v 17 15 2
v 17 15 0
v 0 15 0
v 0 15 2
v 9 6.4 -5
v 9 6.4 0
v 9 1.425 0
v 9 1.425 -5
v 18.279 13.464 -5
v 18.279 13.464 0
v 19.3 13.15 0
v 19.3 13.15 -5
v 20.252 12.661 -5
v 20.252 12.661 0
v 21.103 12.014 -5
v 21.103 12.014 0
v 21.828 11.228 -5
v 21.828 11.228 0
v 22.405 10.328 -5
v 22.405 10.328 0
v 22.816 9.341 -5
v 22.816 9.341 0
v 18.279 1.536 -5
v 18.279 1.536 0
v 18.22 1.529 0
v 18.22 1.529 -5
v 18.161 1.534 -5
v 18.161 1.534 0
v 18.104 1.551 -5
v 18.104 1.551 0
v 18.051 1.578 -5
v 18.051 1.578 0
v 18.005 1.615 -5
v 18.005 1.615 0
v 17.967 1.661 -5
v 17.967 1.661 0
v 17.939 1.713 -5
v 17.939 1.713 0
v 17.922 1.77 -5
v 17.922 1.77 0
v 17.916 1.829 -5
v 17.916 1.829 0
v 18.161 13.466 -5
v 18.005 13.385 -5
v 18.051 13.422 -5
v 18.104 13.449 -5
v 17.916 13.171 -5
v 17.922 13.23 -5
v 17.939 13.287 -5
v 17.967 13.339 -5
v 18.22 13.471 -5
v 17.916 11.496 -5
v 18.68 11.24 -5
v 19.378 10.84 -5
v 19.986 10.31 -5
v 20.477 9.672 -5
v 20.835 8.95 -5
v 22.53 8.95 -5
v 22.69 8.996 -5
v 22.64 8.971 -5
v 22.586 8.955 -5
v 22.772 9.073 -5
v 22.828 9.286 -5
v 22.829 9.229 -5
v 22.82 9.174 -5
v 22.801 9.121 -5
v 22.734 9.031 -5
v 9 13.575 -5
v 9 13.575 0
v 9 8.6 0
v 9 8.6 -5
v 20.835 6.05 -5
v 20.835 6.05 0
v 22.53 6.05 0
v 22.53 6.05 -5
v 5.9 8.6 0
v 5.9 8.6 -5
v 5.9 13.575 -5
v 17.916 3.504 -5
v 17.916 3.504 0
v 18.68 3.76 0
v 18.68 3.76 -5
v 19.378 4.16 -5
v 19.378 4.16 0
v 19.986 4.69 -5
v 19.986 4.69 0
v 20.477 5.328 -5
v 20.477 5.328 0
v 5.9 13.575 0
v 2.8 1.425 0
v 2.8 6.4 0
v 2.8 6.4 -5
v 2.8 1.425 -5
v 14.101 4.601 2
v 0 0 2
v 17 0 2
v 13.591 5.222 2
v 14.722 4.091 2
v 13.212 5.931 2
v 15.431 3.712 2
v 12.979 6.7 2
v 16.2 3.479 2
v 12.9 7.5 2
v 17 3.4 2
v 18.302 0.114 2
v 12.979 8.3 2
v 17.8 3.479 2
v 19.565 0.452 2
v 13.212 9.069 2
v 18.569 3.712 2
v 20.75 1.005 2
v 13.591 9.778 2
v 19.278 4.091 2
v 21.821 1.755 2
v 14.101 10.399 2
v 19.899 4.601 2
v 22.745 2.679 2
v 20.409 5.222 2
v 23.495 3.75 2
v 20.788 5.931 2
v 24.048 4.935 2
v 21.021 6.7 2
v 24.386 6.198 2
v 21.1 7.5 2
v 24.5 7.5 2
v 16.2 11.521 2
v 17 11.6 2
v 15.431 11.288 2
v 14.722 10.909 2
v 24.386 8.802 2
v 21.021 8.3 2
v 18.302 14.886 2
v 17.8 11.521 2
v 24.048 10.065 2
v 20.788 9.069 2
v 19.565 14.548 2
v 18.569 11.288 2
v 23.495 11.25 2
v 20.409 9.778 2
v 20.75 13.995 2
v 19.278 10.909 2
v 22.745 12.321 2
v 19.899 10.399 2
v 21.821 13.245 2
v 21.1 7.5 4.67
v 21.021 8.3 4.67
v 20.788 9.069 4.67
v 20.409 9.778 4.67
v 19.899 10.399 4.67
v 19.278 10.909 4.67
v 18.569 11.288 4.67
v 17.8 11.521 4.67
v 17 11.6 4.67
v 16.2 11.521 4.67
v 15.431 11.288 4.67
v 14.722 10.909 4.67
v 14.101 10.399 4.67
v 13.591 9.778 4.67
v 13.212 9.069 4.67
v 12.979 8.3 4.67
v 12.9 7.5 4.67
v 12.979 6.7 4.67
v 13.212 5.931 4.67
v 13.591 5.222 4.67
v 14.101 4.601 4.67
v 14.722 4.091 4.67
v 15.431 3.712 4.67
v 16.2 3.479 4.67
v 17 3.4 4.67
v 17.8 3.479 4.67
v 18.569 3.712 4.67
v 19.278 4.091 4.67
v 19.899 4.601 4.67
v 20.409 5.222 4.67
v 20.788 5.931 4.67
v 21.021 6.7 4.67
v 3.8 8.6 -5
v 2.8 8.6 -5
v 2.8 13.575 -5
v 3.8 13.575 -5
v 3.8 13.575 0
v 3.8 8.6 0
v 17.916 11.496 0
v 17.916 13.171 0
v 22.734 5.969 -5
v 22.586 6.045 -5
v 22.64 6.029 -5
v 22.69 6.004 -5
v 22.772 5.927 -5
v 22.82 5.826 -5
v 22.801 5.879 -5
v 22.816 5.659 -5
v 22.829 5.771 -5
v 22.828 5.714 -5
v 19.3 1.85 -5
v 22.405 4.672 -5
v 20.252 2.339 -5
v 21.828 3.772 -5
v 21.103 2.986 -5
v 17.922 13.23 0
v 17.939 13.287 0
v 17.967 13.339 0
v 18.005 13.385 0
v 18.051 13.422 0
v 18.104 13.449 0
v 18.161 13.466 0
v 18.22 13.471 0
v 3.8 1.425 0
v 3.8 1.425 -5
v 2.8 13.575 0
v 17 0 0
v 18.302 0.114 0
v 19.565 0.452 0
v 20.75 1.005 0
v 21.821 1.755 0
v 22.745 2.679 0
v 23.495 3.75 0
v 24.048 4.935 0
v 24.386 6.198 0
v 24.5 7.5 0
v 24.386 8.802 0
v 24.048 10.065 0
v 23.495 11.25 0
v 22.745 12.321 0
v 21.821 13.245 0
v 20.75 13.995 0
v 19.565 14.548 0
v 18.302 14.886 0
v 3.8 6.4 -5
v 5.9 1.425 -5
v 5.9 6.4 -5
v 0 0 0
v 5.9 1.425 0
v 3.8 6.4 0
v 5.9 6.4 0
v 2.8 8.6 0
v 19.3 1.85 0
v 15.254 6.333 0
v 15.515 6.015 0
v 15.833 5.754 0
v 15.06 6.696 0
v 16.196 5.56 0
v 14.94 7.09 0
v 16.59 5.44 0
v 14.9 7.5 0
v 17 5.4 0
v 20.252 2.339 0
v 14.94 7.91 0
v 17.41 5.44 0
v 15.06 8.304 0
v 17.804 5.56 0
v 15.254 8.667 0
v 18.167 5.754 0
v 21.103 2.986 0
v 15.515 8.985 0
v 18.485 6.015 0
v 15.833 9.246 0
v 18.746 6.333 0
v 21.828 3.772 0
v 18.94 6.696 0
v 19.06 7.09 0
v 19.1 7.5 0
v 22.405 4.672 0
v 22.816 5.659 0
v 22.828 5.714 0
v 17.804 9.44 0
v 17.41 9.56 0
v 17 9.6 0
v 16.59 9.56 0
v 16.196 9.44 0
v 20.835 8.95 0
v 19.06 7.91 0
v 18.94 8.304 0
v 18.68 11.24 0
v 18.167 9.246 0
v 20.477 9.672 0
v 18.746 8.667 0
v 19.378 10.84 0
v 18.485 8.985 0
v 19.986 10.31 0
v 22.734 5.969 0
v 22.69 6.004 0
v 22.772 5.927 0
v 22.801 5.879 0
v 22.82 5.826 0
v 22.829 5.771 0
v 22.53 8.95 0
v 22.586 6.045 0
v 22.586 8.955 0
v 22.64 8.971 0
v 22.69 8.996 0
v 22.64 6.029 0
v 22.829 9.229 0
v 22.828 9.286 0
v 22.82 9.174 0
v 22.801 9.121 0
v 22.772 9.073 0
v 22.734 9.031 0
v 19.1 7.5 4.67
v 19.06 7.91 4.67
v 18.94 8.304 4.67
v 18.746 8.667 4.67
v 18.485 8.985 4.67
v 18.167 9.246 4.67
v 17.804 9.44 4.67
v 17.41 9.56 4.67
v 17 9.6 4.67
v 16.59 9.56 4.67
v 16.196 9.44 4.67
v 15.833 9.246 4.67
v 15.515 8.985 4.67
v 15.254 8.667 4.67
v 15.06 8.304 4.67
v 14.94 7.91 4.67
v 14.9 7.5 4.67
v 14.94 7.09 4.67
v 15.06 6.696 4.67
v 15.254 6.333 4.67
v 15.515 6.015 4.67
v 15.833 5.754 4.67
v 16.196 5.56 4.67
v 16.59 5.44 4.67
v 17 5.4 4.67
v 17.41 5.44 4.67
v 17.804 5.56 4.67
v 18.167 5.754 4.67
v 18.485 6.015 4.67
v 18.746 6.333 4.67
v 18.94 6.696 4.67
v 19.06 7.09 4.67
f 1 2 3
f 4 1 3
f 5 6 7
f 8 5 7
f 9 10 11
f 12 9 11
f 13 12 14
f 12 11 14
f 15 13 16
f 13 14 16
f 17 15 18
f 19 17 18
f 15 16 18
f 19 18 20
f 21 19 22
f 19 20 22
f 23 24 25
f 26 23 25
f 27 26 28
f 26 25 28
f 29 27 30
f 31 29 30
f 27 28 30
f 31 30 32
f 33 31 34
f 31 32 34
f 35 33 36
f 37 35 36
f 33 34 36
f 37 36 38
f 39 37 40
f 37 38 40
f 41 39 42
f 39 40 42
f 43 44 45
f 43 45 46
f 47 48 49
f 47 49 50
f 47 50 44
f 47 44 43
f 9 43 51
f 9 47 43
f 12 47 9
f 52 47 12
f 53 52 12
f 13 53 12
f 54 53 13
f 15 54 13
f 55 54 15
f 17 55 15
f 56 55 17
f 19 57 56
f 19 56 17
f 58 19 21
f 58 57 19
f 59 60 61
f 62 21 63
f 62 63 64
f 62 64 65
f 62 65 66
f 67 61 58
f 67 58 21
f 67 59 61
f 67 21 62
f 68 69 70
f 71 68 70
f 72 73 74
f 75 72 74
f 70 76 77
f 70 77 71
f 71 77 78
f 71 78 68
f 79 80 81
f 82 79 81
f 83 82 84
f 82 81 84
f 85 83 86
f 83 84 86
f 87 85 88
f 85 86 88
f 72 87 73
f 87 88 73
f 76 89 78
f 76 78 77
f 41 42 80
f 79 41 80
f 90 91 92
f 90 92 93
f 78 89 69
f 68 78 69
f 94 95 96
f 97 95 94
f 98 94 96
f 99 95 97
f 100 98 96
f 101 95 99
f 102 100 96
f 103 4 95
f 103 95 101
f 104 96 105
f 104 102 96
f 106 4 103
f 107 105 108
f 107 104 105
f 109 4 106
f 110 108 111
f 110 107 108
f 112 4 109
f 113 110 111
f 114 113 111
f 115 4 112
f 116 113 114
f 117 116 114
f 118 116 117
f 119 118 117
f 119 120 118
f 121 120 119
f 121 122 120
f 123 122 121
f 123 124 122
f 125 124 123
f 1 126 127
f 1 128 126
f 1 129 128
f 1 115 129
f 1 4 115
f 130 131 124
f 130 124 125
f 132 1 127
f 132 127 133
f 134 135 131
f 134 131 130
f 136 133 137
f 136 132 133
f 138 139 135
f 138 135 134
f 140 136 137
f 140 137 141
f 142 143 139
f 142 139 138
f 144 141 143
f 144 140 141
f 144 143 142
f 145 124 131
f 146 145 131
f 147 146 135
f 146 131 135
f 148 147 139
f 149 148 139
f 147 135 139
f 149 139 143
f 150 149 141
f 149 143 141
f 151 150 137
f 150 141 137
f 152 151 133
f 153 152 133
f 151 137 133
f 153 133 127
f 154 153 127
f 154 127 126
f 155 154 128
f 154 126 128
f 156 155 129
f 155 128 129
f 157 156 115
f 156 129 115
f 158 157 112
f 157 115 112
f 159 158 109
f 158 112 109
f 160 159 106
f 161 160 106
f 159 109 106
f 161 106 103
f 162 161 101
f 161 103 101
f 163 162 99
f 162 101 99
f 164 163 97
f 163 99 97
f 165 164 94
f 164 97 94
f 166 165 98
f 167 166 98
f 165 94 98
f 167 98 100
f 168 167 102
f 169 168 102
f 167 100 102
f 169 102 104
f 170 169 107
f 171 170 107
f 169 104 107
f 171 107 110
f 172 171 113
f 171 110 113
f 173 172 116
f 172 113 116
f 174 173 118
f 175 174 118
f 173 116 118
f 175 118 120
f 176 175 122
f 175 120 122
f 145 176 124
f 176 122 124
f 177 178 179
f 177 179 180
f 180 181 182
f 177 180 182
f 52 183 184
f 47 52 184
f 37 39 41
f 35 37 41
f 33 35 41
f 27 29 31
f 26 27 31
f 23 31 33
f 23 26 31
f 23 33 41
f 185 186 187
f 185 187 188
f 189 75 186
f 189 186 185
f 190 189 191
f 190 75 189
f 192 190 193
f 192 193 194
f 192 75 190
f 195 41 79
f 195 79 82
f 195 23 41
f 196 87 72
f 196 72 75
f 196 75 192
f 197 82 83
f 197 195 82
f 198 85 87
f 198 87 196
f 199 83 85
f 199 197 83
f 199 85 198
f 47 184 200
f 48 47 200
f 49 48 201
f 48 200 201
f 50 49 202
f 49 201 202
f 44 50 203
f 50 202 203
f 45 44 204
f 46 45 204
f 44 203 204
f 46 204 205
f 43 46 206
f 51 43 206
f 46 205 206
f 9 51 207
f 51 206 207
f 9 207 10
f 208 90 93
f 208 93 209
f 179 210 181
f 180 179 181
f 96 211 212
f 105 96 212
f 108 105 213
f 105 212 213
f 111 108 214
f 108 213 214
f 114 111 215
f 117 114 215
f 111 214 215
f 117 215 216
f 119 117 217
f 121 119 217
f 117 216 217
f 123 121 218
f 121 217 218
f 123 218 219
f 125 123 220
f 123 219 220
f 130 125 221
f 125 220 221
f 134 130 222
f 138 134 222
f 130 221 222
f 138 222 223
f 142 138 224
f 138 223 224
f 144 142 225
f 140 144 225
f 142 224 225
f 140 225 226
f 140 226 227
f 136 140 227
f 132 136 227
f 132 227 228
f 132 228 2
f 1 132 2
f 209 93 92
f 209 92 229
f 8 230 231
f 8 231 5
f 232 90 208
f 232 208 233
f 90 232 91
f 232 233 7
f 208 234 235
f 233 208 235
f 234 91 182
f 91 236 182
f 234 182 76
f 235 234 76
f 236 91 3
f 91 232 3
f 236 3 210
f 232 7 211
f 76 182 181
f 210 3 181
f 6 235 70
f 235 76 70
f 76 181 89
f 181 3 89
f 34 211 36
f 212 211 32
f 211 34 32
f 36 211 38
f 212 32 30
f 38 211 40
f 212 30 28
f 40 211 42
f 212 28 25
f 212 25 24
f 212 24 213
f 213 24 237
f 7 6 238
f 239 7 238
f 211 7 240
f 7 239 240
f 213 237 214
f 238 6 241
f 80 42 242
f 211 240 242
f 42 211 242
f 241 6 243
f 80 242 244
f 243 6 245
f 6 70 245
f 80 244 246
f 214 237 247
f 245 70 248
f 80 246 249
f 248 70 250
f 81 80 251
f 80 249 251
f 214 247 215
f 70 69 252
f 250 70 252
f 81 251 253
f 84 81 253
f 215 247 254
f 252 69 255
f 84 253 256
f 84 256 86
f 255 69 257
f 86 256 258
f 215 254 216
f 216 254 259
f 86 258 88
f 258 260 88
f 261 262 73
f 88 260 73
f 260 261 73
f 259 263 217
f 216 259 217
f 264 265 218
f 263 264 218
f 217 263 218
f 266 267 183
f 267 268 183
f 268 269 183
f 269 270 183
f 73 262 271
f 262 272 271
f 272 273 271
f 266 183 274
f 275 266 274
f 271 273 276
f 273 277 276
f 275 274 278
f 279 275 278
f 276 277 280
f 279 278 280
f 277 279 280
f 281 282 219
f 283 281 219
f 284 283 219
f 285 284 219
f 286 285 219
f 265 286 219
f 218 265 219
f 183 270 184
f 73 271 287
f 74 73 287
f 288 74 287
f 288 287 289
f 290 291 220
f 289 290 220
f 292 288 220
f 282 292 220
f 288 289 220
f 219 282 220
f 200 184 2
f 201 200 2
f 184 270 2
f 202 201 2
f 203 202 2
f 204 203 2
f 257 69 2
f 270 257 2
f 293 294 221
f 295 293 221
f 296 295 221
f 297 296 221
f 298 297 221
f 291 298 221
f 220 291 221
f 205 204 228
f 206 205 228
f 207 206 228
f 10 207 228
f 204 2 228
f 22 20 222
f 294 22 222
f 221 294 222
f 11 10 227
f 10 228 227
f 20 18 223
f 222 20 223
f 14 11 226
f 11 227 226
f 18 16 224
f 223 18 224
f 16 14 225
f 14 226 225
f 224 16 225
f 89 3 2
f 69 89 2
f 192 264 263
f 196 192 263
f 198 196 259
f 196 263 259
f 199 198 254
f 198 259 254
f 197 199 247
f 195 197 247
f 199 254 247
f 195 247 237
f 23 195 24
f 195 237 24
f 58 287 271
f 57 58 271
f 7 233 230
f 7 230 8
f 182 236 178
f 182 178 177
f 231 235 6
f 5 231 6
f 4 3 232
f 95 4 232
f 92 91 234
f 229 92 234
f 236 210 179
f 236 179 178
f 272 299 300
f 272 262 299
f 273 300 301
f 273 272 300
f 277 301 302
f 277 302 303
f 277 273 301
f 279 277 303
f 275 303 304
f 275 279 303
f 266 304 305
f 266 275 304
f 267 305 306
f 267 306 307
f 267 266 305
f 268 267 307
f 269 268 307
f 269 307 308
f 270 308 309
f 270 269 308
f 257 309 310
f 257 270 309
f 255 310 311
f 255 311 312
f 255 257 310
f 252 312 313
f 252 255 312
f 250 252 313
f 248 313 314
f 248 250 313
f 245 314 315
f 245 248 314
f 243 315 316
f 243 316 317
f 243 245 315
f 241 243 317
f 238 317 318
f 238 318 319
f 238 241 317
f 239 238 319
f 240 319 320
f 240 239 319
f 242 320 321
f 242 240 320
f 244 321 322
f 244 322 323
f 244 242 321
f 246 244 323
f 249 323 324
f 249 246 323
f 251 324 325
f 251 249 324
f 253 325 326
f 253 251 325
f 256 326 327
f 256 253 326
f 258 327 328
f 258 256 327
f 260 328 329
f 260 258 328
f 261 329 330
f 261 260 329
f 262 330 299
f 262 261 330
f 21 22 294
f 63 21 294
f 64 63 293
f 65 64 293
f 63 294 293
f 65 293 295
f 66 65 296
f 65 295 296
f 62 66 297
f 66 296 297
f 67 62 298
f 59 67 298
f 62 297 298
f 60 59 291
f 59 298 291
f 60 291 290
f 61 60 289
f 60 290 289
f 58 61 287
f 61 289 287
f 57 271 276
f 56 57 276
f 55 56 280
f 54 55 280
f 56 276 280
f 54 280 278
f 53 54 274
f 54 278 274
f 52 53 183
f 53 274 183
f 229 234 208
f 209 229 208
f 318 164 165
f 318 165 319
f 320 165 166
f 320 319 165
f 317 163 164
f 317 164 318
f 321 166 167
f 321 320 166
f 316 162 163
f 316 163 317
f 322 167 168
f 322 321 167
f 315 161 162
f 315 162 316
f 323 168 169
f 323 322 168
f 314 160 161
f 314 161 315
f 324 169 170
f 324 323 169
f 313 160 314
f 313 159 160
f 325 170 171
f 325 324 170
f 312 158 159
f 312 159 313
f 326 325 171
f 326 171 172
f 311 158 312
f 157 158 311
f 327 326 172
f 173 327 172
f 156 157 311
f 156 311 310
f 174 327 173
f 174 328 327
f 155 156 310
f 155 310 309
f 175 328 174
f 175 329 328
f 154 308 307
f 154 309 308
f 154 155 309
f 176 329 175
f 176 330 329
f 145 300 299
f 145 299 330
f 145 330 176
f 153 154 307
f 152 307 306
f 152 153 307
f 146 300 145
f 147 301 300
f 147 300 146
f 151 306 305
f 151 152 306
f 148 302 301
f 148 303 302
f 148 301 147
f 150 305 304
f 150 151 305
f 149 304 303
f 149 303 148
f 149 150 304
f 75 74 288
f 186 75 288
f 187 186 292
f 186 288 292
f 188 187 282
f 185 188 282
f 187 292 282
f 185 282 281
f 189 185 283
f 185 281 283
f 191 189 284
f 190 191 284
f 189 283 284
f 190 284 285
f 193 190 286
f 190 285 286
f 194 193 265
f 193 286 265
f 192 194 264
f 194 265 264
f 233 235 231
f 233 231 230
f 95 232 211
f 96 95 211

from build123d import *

# Parameters (mm, degrees)
F0_R     = 2.1
F1_DEPTH = 2
F2_R     = 4.1
F2_R_2   = 2.1
F3_DEPTH = 2.67
F4_W     = 1
F4_H     = 4.975
F4_W_2   = 3.1
F5_DEPTH = 5


with BuildPart() as f1:
    # F0 (on Top) → F1 (new body)
    with BuildSketch(Plane.XY):
        with BuildLine():
            Line((0, 15), (0, 0))
            Line((0, 0), (17, 0))
            ThreePointArc((17, 0), (24.5, 7.5), (17, 15))
            Line((17, 15), (0, 15))
        make_face()
        with Locations((17, 7.5)):
            Circle(F0_R, mode=Mode.SUBTRACT)
    extrude(amount=F1_DEPTH)

    # F2 (on face) → F3 (join)
    with BuildSketch(Plane.XY.offset(2)):
        with Locations((17, 7.5)):
            Circle(F2_R)
        with Locations((17, 7.5)):
            Circle(F2_R_2, mode=Mode.SUBTRACT)
    extrude(amount=F3_DEPTH)

    # F4 (on face) → F5 (join)
    with BuildSketch(Plane(origin=(0, 0, 0), x_dir=(1, 0, 0), z_dir=(0, 0, -1))):
        with Locations((3.3, -3.9125)):
            Rectangle(F4_W, F4_H)
        with Locations((7.45, -3.9125)):
            Rectangle(F4_W_2, F4_H)
        with BuildLine():
            ThreePointArc((22.529693, -6.05), (22.771721, -5.927264), (22.815711, -5.659483))
            ThreePointArc((22.815711, -5.659483), (21.102936, -2.986031), (18.278593, -1.535505))
            ThreePointArc((18.278593, -1.535505), (18.027117, -1.595534), (17.915711, -1.828841))
            Line((17.915711, -1.828841), (17.915711, -3.503567))
            ThreePointArc((17.915711, -3.503567), (19.695084, -4.410256), (20.835036, -6.05))
            Line((20.835036, -6.05), (22.529693, -6.05))
        make_face()
        with BuildLine():
            ThreePointArc((17.915711, -13.171159), (18.027117, -13.404466), (18.278593, -13.464495))
            ThreePointArc((18.278593, -13.464495), (21.102936, -12.013969), (22.815711, -9.340517))
            ThreePointArc((22.815711, -9.340517), (22.771721, -9.072736), (22.529693, -8.95))
            Line((22.529693, -8.95), (20.835036, -8.95))
            ThreePointArc((20.835036, -8.95), (19.695084, -10.589744), (17.915711, -11.496433))
            Line((17.915711, -11.496433), (17.915711, -13.171159))
        make_face()
        with Locations((3.3, -11.0875)):
            Rectangle(F4_W, F4_H)
        with Locations((7.45, -11.0875)):
            Rectangle(F4_W_2, F4_H)
    extrude(amount=F5_DEPTH)


solid = f1.part
